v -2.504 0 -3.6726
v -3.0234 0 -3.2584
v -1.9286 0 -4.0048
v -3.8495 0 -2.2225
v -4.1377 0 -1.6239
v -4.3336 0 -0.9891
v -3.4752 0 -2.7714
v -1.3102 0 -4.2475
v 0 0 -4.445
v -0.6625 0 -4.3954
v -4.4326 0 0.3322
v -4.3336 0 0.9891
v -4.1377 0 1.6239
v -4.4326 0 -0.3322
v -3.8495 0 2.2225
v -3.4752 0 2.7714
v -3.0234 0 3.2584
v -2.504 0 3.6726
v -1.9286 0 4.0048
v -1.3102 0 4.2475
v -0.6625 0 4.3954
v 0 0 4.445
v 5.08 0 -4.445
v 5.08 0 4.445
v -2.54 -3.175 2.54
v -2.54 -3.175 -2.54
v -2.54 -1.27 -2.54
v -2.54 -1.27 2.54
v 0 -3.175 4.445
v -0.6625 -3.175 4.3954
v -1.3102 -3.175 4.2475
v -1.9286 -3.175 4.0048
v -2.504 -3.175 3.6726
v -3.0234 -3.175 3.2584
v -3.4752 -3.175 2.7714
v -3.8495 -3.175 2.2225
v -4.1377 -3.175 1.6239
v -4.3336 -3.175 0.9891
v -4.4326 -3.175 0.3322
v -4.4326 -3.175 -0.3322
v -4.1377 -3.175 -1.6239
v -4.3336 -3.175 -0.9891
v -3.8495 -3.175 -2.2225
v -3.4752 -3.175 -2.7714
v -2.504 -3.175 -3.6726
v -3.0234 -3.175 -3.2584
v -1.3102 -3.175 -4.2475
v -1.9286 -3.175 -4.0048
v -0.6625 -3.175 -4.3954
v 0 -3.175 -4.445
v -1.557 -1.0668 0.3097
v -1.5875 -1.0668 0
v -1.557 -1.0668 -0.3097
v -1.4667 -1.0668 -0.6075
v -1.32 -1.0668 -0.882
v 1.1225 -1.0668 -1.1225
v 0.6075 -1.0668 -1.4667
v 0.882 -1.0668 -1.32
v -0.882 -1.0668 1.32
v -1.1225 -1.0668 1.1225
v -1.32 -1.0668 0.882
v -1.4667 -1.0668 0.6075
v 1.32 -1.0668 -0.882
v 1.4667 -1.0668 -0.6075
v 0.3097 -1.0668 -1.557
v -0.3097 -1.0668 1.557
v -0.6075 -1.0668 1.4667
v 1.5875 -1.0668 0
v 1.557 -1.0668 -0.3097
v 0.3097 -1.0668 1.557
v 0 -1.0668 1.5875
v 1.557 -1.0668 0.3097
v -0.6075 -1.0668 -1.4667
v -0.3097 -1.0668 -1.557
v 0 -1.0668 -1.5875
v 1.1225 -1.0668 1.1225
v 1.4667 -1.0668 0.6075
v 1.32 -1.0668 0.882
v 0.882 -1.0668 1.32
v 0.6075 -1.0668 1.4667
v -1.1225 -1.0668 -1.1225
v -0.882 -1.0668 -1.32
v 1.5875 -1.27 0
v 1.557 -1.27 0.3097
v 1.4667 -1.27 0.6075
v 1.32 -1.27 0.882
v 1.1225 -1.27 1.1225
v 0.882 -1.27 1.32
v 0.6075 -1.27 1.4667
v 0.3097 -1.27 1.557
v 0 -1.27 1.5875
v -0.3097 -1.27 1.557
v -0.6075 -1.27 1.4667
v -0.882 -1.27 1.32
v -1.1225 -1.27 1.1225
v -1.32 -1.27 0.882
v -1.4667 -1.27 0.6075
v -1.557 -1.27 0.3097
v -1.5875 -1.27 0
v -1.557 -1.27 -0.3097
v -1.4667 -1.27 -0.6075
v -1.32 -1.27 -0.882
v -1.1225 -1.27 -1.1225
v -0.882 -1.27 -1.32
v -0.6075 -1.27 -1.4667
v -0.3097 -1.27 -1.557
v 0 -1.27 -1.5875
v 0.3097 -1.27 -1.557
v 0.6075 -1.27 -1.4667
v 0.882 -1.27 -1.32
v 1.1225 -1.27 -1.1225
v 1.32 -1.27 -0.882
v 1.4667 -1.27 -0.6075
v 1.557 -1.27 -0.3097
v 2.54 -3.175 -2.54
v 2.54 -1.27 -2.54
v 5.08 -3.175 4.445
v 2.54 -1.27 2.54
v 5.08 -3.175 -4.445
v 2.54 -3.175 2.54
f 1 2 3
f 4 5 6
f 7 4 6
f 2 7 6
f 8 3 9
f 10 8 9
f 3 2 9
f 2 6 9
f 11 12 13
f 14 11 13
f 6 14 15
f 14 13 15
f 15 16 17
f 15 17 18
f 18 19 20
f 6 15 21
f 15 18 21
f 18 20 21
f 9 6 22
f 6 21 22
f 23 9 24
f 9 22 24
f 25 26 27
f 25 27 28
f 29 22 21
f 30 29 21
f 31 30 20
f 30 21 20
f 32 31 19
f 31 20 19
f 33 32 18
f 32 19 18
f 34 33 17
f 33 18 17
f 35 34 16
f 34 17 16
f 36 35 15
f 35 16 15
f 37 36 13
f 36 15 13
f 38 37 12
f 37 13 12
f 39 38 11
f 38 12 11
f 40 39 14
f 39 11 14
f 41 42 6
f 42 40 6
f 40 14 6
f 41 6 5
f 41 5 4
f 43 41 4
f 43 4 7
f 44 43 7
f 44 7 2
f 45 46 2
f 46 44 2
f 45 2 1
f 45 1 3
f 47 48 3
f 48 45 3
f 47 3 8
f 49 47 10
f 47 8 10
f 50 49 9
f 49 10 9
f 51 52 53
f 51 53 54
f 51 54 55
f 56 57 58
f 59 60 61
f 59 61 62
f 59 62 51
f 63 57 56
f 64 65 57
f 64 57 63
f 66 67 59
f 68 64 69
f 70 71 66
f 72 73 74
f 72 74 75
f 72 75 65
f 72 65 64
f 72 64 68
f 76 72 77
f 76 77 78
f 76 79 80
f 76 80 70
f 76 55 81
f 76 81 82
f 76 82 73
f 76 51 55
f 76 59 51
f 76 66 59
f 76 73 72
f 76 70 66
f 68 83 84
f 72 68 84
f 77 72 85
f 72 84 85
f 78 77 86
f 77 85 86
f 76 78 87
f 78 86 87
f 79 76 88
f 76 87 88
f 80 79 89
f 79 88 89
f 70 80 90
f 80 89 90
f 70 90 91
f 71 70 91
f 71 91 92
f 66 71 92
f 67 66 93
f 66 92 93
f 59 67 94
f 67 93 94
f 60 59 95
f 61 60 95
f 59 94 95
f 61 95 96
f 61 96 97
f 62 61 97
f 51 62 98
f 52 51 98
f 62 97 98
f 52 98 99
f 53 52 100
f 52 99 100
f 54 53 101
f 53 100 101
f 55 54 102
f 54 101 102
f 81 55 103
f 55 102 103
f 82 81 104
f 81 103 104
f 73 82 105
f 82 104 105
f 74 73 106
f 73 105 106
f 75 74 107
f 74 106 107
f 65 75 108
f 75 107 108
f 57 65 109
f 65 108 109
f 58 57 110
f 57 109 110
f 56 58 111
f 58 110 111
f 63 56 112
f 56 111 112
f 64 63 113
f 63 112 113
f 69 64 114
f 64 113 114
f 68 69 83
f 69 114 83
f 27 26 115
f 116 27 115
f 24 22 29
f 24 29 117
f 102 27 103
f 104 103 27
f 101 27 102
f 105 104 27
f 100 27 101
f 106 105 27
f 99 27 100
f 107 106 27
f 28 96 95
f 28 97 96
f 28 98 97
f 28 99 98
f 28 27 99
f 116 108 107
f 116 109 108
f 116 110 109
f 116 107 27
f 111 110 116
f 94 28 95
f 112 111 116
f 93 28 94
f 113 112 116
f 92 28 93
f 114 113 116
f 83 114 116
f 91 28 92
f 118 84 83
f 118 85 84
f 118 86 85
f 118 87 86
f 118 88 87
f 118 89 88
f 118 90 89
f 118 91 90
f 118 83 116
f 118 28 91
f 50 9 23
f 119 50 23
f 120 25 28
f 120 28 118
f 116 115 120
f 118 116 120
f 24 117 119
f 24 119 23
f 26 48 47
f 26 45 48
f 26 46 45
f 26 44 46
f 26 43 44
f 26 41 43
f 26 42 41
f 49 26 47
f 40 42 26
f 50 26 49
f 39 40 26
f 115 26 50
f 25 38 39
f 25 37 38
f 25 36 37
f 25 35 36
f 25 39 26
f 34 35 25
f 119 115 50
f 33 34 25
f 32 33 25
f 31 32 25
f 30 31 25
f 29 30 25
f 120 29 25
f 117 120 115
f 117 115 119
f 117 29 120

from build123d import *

# Parameters (mm, degrees)
SKETCH1_W               = 10.16
SKETCH1_H               = 3.175
BOSS_EXTRUDE1_DEPTH     = 4.445
SKETCH3_OUTSIDE_W       = 14.934
SKETCH3_OUTSIDE_H       = 13.664
SKETCH3_OUTSIDE_W_2     = 10.16
SKETCH3_OUTSIDE_H_2     = 8.89
SKETCH3_OUTSIDE_W_3     = 5.08
SKETCH3_OUTSIDE_H_3     = 5.08
CUT_EXTRUDE1_DEPTH      = 1.905
CUT_EXTRUDE2_DEPTH      = 1
CUT_EXTRUDE2_DEPTH_BACK = 4.175
SKETCH6_R               = 1.5875
CUT_EXTRUDE3_DEPTH      = 0.2032


with BuildPart() as part:
    # Sketch1 → Boss-Extrude1 (new body, symmetric)
    with BuildSketch(Plane.XY):
        with Locations((0, -1.5875)):
            Rectangle(SKETCH1_W, SKETCH1_H)
    extrude(amount=BOSS_EXTRUDE1_DEPTH, both=True)

    # Sketch3 outside → Cut-Extrude1 (cut)
    with BuildSketch(Plane.XZ.offset(3.175)):
        Rectangle(SKETCH3_OUTSIDE_W, SKETCH3_OUTSIDE_H)
        Rectangle(SKETCH3_OUTSIDE_W_2, SKETCH3_OUTSIDE_H_2, mode=Mode.SUBTRACT)
        Rectangle(SKETCH3_OUTSIDE_W_3, SKETCH3_OUTSIDE_H_3)
    extrude(amount=-CUT_EXTRUDE1_DEPTH, mode=Mode.SUBTRACT)

    # Sketch5 → Cut-Extrude2 (cut, two sides)
    with BuildSketch(Plane(origin=(0, 0, 0), x_dir=(1, 0, 0), z_dir=(0, 1, 0))) as cut_extrude2_sk:
        with BuildLine():
            Line((0, 4.445), (-5.08, 4.445))
            Line((-5.08, 4.445), (-5.08, -4.445))
            Line((-5.08, -4.445), (0, -4.445))
            ThreePointArc((0, -4.445), (-4.445, 0), (0, 4.445))
        make_face()
    extrude(amount=CUT_EXTRUDE2_DEPTH, mode=Mode.SUBTRACT)
    extrude(cut_extrude2_sk.sketch, amount=-CUT_EXTRUDE2_DEPTH_BACK, mode=Mode.SUBTRACT)

    # Sketch6 → Cut-Extrude3 (cut)
    with BuildSketch(Plane.XZ.offset(1.27)):
        Circle(SKETCH6_R)
    extrude(amount=-CUT_EXTRUDE3_DEPTH, mode=Mode.SUBTRACT)


solid = part.part
